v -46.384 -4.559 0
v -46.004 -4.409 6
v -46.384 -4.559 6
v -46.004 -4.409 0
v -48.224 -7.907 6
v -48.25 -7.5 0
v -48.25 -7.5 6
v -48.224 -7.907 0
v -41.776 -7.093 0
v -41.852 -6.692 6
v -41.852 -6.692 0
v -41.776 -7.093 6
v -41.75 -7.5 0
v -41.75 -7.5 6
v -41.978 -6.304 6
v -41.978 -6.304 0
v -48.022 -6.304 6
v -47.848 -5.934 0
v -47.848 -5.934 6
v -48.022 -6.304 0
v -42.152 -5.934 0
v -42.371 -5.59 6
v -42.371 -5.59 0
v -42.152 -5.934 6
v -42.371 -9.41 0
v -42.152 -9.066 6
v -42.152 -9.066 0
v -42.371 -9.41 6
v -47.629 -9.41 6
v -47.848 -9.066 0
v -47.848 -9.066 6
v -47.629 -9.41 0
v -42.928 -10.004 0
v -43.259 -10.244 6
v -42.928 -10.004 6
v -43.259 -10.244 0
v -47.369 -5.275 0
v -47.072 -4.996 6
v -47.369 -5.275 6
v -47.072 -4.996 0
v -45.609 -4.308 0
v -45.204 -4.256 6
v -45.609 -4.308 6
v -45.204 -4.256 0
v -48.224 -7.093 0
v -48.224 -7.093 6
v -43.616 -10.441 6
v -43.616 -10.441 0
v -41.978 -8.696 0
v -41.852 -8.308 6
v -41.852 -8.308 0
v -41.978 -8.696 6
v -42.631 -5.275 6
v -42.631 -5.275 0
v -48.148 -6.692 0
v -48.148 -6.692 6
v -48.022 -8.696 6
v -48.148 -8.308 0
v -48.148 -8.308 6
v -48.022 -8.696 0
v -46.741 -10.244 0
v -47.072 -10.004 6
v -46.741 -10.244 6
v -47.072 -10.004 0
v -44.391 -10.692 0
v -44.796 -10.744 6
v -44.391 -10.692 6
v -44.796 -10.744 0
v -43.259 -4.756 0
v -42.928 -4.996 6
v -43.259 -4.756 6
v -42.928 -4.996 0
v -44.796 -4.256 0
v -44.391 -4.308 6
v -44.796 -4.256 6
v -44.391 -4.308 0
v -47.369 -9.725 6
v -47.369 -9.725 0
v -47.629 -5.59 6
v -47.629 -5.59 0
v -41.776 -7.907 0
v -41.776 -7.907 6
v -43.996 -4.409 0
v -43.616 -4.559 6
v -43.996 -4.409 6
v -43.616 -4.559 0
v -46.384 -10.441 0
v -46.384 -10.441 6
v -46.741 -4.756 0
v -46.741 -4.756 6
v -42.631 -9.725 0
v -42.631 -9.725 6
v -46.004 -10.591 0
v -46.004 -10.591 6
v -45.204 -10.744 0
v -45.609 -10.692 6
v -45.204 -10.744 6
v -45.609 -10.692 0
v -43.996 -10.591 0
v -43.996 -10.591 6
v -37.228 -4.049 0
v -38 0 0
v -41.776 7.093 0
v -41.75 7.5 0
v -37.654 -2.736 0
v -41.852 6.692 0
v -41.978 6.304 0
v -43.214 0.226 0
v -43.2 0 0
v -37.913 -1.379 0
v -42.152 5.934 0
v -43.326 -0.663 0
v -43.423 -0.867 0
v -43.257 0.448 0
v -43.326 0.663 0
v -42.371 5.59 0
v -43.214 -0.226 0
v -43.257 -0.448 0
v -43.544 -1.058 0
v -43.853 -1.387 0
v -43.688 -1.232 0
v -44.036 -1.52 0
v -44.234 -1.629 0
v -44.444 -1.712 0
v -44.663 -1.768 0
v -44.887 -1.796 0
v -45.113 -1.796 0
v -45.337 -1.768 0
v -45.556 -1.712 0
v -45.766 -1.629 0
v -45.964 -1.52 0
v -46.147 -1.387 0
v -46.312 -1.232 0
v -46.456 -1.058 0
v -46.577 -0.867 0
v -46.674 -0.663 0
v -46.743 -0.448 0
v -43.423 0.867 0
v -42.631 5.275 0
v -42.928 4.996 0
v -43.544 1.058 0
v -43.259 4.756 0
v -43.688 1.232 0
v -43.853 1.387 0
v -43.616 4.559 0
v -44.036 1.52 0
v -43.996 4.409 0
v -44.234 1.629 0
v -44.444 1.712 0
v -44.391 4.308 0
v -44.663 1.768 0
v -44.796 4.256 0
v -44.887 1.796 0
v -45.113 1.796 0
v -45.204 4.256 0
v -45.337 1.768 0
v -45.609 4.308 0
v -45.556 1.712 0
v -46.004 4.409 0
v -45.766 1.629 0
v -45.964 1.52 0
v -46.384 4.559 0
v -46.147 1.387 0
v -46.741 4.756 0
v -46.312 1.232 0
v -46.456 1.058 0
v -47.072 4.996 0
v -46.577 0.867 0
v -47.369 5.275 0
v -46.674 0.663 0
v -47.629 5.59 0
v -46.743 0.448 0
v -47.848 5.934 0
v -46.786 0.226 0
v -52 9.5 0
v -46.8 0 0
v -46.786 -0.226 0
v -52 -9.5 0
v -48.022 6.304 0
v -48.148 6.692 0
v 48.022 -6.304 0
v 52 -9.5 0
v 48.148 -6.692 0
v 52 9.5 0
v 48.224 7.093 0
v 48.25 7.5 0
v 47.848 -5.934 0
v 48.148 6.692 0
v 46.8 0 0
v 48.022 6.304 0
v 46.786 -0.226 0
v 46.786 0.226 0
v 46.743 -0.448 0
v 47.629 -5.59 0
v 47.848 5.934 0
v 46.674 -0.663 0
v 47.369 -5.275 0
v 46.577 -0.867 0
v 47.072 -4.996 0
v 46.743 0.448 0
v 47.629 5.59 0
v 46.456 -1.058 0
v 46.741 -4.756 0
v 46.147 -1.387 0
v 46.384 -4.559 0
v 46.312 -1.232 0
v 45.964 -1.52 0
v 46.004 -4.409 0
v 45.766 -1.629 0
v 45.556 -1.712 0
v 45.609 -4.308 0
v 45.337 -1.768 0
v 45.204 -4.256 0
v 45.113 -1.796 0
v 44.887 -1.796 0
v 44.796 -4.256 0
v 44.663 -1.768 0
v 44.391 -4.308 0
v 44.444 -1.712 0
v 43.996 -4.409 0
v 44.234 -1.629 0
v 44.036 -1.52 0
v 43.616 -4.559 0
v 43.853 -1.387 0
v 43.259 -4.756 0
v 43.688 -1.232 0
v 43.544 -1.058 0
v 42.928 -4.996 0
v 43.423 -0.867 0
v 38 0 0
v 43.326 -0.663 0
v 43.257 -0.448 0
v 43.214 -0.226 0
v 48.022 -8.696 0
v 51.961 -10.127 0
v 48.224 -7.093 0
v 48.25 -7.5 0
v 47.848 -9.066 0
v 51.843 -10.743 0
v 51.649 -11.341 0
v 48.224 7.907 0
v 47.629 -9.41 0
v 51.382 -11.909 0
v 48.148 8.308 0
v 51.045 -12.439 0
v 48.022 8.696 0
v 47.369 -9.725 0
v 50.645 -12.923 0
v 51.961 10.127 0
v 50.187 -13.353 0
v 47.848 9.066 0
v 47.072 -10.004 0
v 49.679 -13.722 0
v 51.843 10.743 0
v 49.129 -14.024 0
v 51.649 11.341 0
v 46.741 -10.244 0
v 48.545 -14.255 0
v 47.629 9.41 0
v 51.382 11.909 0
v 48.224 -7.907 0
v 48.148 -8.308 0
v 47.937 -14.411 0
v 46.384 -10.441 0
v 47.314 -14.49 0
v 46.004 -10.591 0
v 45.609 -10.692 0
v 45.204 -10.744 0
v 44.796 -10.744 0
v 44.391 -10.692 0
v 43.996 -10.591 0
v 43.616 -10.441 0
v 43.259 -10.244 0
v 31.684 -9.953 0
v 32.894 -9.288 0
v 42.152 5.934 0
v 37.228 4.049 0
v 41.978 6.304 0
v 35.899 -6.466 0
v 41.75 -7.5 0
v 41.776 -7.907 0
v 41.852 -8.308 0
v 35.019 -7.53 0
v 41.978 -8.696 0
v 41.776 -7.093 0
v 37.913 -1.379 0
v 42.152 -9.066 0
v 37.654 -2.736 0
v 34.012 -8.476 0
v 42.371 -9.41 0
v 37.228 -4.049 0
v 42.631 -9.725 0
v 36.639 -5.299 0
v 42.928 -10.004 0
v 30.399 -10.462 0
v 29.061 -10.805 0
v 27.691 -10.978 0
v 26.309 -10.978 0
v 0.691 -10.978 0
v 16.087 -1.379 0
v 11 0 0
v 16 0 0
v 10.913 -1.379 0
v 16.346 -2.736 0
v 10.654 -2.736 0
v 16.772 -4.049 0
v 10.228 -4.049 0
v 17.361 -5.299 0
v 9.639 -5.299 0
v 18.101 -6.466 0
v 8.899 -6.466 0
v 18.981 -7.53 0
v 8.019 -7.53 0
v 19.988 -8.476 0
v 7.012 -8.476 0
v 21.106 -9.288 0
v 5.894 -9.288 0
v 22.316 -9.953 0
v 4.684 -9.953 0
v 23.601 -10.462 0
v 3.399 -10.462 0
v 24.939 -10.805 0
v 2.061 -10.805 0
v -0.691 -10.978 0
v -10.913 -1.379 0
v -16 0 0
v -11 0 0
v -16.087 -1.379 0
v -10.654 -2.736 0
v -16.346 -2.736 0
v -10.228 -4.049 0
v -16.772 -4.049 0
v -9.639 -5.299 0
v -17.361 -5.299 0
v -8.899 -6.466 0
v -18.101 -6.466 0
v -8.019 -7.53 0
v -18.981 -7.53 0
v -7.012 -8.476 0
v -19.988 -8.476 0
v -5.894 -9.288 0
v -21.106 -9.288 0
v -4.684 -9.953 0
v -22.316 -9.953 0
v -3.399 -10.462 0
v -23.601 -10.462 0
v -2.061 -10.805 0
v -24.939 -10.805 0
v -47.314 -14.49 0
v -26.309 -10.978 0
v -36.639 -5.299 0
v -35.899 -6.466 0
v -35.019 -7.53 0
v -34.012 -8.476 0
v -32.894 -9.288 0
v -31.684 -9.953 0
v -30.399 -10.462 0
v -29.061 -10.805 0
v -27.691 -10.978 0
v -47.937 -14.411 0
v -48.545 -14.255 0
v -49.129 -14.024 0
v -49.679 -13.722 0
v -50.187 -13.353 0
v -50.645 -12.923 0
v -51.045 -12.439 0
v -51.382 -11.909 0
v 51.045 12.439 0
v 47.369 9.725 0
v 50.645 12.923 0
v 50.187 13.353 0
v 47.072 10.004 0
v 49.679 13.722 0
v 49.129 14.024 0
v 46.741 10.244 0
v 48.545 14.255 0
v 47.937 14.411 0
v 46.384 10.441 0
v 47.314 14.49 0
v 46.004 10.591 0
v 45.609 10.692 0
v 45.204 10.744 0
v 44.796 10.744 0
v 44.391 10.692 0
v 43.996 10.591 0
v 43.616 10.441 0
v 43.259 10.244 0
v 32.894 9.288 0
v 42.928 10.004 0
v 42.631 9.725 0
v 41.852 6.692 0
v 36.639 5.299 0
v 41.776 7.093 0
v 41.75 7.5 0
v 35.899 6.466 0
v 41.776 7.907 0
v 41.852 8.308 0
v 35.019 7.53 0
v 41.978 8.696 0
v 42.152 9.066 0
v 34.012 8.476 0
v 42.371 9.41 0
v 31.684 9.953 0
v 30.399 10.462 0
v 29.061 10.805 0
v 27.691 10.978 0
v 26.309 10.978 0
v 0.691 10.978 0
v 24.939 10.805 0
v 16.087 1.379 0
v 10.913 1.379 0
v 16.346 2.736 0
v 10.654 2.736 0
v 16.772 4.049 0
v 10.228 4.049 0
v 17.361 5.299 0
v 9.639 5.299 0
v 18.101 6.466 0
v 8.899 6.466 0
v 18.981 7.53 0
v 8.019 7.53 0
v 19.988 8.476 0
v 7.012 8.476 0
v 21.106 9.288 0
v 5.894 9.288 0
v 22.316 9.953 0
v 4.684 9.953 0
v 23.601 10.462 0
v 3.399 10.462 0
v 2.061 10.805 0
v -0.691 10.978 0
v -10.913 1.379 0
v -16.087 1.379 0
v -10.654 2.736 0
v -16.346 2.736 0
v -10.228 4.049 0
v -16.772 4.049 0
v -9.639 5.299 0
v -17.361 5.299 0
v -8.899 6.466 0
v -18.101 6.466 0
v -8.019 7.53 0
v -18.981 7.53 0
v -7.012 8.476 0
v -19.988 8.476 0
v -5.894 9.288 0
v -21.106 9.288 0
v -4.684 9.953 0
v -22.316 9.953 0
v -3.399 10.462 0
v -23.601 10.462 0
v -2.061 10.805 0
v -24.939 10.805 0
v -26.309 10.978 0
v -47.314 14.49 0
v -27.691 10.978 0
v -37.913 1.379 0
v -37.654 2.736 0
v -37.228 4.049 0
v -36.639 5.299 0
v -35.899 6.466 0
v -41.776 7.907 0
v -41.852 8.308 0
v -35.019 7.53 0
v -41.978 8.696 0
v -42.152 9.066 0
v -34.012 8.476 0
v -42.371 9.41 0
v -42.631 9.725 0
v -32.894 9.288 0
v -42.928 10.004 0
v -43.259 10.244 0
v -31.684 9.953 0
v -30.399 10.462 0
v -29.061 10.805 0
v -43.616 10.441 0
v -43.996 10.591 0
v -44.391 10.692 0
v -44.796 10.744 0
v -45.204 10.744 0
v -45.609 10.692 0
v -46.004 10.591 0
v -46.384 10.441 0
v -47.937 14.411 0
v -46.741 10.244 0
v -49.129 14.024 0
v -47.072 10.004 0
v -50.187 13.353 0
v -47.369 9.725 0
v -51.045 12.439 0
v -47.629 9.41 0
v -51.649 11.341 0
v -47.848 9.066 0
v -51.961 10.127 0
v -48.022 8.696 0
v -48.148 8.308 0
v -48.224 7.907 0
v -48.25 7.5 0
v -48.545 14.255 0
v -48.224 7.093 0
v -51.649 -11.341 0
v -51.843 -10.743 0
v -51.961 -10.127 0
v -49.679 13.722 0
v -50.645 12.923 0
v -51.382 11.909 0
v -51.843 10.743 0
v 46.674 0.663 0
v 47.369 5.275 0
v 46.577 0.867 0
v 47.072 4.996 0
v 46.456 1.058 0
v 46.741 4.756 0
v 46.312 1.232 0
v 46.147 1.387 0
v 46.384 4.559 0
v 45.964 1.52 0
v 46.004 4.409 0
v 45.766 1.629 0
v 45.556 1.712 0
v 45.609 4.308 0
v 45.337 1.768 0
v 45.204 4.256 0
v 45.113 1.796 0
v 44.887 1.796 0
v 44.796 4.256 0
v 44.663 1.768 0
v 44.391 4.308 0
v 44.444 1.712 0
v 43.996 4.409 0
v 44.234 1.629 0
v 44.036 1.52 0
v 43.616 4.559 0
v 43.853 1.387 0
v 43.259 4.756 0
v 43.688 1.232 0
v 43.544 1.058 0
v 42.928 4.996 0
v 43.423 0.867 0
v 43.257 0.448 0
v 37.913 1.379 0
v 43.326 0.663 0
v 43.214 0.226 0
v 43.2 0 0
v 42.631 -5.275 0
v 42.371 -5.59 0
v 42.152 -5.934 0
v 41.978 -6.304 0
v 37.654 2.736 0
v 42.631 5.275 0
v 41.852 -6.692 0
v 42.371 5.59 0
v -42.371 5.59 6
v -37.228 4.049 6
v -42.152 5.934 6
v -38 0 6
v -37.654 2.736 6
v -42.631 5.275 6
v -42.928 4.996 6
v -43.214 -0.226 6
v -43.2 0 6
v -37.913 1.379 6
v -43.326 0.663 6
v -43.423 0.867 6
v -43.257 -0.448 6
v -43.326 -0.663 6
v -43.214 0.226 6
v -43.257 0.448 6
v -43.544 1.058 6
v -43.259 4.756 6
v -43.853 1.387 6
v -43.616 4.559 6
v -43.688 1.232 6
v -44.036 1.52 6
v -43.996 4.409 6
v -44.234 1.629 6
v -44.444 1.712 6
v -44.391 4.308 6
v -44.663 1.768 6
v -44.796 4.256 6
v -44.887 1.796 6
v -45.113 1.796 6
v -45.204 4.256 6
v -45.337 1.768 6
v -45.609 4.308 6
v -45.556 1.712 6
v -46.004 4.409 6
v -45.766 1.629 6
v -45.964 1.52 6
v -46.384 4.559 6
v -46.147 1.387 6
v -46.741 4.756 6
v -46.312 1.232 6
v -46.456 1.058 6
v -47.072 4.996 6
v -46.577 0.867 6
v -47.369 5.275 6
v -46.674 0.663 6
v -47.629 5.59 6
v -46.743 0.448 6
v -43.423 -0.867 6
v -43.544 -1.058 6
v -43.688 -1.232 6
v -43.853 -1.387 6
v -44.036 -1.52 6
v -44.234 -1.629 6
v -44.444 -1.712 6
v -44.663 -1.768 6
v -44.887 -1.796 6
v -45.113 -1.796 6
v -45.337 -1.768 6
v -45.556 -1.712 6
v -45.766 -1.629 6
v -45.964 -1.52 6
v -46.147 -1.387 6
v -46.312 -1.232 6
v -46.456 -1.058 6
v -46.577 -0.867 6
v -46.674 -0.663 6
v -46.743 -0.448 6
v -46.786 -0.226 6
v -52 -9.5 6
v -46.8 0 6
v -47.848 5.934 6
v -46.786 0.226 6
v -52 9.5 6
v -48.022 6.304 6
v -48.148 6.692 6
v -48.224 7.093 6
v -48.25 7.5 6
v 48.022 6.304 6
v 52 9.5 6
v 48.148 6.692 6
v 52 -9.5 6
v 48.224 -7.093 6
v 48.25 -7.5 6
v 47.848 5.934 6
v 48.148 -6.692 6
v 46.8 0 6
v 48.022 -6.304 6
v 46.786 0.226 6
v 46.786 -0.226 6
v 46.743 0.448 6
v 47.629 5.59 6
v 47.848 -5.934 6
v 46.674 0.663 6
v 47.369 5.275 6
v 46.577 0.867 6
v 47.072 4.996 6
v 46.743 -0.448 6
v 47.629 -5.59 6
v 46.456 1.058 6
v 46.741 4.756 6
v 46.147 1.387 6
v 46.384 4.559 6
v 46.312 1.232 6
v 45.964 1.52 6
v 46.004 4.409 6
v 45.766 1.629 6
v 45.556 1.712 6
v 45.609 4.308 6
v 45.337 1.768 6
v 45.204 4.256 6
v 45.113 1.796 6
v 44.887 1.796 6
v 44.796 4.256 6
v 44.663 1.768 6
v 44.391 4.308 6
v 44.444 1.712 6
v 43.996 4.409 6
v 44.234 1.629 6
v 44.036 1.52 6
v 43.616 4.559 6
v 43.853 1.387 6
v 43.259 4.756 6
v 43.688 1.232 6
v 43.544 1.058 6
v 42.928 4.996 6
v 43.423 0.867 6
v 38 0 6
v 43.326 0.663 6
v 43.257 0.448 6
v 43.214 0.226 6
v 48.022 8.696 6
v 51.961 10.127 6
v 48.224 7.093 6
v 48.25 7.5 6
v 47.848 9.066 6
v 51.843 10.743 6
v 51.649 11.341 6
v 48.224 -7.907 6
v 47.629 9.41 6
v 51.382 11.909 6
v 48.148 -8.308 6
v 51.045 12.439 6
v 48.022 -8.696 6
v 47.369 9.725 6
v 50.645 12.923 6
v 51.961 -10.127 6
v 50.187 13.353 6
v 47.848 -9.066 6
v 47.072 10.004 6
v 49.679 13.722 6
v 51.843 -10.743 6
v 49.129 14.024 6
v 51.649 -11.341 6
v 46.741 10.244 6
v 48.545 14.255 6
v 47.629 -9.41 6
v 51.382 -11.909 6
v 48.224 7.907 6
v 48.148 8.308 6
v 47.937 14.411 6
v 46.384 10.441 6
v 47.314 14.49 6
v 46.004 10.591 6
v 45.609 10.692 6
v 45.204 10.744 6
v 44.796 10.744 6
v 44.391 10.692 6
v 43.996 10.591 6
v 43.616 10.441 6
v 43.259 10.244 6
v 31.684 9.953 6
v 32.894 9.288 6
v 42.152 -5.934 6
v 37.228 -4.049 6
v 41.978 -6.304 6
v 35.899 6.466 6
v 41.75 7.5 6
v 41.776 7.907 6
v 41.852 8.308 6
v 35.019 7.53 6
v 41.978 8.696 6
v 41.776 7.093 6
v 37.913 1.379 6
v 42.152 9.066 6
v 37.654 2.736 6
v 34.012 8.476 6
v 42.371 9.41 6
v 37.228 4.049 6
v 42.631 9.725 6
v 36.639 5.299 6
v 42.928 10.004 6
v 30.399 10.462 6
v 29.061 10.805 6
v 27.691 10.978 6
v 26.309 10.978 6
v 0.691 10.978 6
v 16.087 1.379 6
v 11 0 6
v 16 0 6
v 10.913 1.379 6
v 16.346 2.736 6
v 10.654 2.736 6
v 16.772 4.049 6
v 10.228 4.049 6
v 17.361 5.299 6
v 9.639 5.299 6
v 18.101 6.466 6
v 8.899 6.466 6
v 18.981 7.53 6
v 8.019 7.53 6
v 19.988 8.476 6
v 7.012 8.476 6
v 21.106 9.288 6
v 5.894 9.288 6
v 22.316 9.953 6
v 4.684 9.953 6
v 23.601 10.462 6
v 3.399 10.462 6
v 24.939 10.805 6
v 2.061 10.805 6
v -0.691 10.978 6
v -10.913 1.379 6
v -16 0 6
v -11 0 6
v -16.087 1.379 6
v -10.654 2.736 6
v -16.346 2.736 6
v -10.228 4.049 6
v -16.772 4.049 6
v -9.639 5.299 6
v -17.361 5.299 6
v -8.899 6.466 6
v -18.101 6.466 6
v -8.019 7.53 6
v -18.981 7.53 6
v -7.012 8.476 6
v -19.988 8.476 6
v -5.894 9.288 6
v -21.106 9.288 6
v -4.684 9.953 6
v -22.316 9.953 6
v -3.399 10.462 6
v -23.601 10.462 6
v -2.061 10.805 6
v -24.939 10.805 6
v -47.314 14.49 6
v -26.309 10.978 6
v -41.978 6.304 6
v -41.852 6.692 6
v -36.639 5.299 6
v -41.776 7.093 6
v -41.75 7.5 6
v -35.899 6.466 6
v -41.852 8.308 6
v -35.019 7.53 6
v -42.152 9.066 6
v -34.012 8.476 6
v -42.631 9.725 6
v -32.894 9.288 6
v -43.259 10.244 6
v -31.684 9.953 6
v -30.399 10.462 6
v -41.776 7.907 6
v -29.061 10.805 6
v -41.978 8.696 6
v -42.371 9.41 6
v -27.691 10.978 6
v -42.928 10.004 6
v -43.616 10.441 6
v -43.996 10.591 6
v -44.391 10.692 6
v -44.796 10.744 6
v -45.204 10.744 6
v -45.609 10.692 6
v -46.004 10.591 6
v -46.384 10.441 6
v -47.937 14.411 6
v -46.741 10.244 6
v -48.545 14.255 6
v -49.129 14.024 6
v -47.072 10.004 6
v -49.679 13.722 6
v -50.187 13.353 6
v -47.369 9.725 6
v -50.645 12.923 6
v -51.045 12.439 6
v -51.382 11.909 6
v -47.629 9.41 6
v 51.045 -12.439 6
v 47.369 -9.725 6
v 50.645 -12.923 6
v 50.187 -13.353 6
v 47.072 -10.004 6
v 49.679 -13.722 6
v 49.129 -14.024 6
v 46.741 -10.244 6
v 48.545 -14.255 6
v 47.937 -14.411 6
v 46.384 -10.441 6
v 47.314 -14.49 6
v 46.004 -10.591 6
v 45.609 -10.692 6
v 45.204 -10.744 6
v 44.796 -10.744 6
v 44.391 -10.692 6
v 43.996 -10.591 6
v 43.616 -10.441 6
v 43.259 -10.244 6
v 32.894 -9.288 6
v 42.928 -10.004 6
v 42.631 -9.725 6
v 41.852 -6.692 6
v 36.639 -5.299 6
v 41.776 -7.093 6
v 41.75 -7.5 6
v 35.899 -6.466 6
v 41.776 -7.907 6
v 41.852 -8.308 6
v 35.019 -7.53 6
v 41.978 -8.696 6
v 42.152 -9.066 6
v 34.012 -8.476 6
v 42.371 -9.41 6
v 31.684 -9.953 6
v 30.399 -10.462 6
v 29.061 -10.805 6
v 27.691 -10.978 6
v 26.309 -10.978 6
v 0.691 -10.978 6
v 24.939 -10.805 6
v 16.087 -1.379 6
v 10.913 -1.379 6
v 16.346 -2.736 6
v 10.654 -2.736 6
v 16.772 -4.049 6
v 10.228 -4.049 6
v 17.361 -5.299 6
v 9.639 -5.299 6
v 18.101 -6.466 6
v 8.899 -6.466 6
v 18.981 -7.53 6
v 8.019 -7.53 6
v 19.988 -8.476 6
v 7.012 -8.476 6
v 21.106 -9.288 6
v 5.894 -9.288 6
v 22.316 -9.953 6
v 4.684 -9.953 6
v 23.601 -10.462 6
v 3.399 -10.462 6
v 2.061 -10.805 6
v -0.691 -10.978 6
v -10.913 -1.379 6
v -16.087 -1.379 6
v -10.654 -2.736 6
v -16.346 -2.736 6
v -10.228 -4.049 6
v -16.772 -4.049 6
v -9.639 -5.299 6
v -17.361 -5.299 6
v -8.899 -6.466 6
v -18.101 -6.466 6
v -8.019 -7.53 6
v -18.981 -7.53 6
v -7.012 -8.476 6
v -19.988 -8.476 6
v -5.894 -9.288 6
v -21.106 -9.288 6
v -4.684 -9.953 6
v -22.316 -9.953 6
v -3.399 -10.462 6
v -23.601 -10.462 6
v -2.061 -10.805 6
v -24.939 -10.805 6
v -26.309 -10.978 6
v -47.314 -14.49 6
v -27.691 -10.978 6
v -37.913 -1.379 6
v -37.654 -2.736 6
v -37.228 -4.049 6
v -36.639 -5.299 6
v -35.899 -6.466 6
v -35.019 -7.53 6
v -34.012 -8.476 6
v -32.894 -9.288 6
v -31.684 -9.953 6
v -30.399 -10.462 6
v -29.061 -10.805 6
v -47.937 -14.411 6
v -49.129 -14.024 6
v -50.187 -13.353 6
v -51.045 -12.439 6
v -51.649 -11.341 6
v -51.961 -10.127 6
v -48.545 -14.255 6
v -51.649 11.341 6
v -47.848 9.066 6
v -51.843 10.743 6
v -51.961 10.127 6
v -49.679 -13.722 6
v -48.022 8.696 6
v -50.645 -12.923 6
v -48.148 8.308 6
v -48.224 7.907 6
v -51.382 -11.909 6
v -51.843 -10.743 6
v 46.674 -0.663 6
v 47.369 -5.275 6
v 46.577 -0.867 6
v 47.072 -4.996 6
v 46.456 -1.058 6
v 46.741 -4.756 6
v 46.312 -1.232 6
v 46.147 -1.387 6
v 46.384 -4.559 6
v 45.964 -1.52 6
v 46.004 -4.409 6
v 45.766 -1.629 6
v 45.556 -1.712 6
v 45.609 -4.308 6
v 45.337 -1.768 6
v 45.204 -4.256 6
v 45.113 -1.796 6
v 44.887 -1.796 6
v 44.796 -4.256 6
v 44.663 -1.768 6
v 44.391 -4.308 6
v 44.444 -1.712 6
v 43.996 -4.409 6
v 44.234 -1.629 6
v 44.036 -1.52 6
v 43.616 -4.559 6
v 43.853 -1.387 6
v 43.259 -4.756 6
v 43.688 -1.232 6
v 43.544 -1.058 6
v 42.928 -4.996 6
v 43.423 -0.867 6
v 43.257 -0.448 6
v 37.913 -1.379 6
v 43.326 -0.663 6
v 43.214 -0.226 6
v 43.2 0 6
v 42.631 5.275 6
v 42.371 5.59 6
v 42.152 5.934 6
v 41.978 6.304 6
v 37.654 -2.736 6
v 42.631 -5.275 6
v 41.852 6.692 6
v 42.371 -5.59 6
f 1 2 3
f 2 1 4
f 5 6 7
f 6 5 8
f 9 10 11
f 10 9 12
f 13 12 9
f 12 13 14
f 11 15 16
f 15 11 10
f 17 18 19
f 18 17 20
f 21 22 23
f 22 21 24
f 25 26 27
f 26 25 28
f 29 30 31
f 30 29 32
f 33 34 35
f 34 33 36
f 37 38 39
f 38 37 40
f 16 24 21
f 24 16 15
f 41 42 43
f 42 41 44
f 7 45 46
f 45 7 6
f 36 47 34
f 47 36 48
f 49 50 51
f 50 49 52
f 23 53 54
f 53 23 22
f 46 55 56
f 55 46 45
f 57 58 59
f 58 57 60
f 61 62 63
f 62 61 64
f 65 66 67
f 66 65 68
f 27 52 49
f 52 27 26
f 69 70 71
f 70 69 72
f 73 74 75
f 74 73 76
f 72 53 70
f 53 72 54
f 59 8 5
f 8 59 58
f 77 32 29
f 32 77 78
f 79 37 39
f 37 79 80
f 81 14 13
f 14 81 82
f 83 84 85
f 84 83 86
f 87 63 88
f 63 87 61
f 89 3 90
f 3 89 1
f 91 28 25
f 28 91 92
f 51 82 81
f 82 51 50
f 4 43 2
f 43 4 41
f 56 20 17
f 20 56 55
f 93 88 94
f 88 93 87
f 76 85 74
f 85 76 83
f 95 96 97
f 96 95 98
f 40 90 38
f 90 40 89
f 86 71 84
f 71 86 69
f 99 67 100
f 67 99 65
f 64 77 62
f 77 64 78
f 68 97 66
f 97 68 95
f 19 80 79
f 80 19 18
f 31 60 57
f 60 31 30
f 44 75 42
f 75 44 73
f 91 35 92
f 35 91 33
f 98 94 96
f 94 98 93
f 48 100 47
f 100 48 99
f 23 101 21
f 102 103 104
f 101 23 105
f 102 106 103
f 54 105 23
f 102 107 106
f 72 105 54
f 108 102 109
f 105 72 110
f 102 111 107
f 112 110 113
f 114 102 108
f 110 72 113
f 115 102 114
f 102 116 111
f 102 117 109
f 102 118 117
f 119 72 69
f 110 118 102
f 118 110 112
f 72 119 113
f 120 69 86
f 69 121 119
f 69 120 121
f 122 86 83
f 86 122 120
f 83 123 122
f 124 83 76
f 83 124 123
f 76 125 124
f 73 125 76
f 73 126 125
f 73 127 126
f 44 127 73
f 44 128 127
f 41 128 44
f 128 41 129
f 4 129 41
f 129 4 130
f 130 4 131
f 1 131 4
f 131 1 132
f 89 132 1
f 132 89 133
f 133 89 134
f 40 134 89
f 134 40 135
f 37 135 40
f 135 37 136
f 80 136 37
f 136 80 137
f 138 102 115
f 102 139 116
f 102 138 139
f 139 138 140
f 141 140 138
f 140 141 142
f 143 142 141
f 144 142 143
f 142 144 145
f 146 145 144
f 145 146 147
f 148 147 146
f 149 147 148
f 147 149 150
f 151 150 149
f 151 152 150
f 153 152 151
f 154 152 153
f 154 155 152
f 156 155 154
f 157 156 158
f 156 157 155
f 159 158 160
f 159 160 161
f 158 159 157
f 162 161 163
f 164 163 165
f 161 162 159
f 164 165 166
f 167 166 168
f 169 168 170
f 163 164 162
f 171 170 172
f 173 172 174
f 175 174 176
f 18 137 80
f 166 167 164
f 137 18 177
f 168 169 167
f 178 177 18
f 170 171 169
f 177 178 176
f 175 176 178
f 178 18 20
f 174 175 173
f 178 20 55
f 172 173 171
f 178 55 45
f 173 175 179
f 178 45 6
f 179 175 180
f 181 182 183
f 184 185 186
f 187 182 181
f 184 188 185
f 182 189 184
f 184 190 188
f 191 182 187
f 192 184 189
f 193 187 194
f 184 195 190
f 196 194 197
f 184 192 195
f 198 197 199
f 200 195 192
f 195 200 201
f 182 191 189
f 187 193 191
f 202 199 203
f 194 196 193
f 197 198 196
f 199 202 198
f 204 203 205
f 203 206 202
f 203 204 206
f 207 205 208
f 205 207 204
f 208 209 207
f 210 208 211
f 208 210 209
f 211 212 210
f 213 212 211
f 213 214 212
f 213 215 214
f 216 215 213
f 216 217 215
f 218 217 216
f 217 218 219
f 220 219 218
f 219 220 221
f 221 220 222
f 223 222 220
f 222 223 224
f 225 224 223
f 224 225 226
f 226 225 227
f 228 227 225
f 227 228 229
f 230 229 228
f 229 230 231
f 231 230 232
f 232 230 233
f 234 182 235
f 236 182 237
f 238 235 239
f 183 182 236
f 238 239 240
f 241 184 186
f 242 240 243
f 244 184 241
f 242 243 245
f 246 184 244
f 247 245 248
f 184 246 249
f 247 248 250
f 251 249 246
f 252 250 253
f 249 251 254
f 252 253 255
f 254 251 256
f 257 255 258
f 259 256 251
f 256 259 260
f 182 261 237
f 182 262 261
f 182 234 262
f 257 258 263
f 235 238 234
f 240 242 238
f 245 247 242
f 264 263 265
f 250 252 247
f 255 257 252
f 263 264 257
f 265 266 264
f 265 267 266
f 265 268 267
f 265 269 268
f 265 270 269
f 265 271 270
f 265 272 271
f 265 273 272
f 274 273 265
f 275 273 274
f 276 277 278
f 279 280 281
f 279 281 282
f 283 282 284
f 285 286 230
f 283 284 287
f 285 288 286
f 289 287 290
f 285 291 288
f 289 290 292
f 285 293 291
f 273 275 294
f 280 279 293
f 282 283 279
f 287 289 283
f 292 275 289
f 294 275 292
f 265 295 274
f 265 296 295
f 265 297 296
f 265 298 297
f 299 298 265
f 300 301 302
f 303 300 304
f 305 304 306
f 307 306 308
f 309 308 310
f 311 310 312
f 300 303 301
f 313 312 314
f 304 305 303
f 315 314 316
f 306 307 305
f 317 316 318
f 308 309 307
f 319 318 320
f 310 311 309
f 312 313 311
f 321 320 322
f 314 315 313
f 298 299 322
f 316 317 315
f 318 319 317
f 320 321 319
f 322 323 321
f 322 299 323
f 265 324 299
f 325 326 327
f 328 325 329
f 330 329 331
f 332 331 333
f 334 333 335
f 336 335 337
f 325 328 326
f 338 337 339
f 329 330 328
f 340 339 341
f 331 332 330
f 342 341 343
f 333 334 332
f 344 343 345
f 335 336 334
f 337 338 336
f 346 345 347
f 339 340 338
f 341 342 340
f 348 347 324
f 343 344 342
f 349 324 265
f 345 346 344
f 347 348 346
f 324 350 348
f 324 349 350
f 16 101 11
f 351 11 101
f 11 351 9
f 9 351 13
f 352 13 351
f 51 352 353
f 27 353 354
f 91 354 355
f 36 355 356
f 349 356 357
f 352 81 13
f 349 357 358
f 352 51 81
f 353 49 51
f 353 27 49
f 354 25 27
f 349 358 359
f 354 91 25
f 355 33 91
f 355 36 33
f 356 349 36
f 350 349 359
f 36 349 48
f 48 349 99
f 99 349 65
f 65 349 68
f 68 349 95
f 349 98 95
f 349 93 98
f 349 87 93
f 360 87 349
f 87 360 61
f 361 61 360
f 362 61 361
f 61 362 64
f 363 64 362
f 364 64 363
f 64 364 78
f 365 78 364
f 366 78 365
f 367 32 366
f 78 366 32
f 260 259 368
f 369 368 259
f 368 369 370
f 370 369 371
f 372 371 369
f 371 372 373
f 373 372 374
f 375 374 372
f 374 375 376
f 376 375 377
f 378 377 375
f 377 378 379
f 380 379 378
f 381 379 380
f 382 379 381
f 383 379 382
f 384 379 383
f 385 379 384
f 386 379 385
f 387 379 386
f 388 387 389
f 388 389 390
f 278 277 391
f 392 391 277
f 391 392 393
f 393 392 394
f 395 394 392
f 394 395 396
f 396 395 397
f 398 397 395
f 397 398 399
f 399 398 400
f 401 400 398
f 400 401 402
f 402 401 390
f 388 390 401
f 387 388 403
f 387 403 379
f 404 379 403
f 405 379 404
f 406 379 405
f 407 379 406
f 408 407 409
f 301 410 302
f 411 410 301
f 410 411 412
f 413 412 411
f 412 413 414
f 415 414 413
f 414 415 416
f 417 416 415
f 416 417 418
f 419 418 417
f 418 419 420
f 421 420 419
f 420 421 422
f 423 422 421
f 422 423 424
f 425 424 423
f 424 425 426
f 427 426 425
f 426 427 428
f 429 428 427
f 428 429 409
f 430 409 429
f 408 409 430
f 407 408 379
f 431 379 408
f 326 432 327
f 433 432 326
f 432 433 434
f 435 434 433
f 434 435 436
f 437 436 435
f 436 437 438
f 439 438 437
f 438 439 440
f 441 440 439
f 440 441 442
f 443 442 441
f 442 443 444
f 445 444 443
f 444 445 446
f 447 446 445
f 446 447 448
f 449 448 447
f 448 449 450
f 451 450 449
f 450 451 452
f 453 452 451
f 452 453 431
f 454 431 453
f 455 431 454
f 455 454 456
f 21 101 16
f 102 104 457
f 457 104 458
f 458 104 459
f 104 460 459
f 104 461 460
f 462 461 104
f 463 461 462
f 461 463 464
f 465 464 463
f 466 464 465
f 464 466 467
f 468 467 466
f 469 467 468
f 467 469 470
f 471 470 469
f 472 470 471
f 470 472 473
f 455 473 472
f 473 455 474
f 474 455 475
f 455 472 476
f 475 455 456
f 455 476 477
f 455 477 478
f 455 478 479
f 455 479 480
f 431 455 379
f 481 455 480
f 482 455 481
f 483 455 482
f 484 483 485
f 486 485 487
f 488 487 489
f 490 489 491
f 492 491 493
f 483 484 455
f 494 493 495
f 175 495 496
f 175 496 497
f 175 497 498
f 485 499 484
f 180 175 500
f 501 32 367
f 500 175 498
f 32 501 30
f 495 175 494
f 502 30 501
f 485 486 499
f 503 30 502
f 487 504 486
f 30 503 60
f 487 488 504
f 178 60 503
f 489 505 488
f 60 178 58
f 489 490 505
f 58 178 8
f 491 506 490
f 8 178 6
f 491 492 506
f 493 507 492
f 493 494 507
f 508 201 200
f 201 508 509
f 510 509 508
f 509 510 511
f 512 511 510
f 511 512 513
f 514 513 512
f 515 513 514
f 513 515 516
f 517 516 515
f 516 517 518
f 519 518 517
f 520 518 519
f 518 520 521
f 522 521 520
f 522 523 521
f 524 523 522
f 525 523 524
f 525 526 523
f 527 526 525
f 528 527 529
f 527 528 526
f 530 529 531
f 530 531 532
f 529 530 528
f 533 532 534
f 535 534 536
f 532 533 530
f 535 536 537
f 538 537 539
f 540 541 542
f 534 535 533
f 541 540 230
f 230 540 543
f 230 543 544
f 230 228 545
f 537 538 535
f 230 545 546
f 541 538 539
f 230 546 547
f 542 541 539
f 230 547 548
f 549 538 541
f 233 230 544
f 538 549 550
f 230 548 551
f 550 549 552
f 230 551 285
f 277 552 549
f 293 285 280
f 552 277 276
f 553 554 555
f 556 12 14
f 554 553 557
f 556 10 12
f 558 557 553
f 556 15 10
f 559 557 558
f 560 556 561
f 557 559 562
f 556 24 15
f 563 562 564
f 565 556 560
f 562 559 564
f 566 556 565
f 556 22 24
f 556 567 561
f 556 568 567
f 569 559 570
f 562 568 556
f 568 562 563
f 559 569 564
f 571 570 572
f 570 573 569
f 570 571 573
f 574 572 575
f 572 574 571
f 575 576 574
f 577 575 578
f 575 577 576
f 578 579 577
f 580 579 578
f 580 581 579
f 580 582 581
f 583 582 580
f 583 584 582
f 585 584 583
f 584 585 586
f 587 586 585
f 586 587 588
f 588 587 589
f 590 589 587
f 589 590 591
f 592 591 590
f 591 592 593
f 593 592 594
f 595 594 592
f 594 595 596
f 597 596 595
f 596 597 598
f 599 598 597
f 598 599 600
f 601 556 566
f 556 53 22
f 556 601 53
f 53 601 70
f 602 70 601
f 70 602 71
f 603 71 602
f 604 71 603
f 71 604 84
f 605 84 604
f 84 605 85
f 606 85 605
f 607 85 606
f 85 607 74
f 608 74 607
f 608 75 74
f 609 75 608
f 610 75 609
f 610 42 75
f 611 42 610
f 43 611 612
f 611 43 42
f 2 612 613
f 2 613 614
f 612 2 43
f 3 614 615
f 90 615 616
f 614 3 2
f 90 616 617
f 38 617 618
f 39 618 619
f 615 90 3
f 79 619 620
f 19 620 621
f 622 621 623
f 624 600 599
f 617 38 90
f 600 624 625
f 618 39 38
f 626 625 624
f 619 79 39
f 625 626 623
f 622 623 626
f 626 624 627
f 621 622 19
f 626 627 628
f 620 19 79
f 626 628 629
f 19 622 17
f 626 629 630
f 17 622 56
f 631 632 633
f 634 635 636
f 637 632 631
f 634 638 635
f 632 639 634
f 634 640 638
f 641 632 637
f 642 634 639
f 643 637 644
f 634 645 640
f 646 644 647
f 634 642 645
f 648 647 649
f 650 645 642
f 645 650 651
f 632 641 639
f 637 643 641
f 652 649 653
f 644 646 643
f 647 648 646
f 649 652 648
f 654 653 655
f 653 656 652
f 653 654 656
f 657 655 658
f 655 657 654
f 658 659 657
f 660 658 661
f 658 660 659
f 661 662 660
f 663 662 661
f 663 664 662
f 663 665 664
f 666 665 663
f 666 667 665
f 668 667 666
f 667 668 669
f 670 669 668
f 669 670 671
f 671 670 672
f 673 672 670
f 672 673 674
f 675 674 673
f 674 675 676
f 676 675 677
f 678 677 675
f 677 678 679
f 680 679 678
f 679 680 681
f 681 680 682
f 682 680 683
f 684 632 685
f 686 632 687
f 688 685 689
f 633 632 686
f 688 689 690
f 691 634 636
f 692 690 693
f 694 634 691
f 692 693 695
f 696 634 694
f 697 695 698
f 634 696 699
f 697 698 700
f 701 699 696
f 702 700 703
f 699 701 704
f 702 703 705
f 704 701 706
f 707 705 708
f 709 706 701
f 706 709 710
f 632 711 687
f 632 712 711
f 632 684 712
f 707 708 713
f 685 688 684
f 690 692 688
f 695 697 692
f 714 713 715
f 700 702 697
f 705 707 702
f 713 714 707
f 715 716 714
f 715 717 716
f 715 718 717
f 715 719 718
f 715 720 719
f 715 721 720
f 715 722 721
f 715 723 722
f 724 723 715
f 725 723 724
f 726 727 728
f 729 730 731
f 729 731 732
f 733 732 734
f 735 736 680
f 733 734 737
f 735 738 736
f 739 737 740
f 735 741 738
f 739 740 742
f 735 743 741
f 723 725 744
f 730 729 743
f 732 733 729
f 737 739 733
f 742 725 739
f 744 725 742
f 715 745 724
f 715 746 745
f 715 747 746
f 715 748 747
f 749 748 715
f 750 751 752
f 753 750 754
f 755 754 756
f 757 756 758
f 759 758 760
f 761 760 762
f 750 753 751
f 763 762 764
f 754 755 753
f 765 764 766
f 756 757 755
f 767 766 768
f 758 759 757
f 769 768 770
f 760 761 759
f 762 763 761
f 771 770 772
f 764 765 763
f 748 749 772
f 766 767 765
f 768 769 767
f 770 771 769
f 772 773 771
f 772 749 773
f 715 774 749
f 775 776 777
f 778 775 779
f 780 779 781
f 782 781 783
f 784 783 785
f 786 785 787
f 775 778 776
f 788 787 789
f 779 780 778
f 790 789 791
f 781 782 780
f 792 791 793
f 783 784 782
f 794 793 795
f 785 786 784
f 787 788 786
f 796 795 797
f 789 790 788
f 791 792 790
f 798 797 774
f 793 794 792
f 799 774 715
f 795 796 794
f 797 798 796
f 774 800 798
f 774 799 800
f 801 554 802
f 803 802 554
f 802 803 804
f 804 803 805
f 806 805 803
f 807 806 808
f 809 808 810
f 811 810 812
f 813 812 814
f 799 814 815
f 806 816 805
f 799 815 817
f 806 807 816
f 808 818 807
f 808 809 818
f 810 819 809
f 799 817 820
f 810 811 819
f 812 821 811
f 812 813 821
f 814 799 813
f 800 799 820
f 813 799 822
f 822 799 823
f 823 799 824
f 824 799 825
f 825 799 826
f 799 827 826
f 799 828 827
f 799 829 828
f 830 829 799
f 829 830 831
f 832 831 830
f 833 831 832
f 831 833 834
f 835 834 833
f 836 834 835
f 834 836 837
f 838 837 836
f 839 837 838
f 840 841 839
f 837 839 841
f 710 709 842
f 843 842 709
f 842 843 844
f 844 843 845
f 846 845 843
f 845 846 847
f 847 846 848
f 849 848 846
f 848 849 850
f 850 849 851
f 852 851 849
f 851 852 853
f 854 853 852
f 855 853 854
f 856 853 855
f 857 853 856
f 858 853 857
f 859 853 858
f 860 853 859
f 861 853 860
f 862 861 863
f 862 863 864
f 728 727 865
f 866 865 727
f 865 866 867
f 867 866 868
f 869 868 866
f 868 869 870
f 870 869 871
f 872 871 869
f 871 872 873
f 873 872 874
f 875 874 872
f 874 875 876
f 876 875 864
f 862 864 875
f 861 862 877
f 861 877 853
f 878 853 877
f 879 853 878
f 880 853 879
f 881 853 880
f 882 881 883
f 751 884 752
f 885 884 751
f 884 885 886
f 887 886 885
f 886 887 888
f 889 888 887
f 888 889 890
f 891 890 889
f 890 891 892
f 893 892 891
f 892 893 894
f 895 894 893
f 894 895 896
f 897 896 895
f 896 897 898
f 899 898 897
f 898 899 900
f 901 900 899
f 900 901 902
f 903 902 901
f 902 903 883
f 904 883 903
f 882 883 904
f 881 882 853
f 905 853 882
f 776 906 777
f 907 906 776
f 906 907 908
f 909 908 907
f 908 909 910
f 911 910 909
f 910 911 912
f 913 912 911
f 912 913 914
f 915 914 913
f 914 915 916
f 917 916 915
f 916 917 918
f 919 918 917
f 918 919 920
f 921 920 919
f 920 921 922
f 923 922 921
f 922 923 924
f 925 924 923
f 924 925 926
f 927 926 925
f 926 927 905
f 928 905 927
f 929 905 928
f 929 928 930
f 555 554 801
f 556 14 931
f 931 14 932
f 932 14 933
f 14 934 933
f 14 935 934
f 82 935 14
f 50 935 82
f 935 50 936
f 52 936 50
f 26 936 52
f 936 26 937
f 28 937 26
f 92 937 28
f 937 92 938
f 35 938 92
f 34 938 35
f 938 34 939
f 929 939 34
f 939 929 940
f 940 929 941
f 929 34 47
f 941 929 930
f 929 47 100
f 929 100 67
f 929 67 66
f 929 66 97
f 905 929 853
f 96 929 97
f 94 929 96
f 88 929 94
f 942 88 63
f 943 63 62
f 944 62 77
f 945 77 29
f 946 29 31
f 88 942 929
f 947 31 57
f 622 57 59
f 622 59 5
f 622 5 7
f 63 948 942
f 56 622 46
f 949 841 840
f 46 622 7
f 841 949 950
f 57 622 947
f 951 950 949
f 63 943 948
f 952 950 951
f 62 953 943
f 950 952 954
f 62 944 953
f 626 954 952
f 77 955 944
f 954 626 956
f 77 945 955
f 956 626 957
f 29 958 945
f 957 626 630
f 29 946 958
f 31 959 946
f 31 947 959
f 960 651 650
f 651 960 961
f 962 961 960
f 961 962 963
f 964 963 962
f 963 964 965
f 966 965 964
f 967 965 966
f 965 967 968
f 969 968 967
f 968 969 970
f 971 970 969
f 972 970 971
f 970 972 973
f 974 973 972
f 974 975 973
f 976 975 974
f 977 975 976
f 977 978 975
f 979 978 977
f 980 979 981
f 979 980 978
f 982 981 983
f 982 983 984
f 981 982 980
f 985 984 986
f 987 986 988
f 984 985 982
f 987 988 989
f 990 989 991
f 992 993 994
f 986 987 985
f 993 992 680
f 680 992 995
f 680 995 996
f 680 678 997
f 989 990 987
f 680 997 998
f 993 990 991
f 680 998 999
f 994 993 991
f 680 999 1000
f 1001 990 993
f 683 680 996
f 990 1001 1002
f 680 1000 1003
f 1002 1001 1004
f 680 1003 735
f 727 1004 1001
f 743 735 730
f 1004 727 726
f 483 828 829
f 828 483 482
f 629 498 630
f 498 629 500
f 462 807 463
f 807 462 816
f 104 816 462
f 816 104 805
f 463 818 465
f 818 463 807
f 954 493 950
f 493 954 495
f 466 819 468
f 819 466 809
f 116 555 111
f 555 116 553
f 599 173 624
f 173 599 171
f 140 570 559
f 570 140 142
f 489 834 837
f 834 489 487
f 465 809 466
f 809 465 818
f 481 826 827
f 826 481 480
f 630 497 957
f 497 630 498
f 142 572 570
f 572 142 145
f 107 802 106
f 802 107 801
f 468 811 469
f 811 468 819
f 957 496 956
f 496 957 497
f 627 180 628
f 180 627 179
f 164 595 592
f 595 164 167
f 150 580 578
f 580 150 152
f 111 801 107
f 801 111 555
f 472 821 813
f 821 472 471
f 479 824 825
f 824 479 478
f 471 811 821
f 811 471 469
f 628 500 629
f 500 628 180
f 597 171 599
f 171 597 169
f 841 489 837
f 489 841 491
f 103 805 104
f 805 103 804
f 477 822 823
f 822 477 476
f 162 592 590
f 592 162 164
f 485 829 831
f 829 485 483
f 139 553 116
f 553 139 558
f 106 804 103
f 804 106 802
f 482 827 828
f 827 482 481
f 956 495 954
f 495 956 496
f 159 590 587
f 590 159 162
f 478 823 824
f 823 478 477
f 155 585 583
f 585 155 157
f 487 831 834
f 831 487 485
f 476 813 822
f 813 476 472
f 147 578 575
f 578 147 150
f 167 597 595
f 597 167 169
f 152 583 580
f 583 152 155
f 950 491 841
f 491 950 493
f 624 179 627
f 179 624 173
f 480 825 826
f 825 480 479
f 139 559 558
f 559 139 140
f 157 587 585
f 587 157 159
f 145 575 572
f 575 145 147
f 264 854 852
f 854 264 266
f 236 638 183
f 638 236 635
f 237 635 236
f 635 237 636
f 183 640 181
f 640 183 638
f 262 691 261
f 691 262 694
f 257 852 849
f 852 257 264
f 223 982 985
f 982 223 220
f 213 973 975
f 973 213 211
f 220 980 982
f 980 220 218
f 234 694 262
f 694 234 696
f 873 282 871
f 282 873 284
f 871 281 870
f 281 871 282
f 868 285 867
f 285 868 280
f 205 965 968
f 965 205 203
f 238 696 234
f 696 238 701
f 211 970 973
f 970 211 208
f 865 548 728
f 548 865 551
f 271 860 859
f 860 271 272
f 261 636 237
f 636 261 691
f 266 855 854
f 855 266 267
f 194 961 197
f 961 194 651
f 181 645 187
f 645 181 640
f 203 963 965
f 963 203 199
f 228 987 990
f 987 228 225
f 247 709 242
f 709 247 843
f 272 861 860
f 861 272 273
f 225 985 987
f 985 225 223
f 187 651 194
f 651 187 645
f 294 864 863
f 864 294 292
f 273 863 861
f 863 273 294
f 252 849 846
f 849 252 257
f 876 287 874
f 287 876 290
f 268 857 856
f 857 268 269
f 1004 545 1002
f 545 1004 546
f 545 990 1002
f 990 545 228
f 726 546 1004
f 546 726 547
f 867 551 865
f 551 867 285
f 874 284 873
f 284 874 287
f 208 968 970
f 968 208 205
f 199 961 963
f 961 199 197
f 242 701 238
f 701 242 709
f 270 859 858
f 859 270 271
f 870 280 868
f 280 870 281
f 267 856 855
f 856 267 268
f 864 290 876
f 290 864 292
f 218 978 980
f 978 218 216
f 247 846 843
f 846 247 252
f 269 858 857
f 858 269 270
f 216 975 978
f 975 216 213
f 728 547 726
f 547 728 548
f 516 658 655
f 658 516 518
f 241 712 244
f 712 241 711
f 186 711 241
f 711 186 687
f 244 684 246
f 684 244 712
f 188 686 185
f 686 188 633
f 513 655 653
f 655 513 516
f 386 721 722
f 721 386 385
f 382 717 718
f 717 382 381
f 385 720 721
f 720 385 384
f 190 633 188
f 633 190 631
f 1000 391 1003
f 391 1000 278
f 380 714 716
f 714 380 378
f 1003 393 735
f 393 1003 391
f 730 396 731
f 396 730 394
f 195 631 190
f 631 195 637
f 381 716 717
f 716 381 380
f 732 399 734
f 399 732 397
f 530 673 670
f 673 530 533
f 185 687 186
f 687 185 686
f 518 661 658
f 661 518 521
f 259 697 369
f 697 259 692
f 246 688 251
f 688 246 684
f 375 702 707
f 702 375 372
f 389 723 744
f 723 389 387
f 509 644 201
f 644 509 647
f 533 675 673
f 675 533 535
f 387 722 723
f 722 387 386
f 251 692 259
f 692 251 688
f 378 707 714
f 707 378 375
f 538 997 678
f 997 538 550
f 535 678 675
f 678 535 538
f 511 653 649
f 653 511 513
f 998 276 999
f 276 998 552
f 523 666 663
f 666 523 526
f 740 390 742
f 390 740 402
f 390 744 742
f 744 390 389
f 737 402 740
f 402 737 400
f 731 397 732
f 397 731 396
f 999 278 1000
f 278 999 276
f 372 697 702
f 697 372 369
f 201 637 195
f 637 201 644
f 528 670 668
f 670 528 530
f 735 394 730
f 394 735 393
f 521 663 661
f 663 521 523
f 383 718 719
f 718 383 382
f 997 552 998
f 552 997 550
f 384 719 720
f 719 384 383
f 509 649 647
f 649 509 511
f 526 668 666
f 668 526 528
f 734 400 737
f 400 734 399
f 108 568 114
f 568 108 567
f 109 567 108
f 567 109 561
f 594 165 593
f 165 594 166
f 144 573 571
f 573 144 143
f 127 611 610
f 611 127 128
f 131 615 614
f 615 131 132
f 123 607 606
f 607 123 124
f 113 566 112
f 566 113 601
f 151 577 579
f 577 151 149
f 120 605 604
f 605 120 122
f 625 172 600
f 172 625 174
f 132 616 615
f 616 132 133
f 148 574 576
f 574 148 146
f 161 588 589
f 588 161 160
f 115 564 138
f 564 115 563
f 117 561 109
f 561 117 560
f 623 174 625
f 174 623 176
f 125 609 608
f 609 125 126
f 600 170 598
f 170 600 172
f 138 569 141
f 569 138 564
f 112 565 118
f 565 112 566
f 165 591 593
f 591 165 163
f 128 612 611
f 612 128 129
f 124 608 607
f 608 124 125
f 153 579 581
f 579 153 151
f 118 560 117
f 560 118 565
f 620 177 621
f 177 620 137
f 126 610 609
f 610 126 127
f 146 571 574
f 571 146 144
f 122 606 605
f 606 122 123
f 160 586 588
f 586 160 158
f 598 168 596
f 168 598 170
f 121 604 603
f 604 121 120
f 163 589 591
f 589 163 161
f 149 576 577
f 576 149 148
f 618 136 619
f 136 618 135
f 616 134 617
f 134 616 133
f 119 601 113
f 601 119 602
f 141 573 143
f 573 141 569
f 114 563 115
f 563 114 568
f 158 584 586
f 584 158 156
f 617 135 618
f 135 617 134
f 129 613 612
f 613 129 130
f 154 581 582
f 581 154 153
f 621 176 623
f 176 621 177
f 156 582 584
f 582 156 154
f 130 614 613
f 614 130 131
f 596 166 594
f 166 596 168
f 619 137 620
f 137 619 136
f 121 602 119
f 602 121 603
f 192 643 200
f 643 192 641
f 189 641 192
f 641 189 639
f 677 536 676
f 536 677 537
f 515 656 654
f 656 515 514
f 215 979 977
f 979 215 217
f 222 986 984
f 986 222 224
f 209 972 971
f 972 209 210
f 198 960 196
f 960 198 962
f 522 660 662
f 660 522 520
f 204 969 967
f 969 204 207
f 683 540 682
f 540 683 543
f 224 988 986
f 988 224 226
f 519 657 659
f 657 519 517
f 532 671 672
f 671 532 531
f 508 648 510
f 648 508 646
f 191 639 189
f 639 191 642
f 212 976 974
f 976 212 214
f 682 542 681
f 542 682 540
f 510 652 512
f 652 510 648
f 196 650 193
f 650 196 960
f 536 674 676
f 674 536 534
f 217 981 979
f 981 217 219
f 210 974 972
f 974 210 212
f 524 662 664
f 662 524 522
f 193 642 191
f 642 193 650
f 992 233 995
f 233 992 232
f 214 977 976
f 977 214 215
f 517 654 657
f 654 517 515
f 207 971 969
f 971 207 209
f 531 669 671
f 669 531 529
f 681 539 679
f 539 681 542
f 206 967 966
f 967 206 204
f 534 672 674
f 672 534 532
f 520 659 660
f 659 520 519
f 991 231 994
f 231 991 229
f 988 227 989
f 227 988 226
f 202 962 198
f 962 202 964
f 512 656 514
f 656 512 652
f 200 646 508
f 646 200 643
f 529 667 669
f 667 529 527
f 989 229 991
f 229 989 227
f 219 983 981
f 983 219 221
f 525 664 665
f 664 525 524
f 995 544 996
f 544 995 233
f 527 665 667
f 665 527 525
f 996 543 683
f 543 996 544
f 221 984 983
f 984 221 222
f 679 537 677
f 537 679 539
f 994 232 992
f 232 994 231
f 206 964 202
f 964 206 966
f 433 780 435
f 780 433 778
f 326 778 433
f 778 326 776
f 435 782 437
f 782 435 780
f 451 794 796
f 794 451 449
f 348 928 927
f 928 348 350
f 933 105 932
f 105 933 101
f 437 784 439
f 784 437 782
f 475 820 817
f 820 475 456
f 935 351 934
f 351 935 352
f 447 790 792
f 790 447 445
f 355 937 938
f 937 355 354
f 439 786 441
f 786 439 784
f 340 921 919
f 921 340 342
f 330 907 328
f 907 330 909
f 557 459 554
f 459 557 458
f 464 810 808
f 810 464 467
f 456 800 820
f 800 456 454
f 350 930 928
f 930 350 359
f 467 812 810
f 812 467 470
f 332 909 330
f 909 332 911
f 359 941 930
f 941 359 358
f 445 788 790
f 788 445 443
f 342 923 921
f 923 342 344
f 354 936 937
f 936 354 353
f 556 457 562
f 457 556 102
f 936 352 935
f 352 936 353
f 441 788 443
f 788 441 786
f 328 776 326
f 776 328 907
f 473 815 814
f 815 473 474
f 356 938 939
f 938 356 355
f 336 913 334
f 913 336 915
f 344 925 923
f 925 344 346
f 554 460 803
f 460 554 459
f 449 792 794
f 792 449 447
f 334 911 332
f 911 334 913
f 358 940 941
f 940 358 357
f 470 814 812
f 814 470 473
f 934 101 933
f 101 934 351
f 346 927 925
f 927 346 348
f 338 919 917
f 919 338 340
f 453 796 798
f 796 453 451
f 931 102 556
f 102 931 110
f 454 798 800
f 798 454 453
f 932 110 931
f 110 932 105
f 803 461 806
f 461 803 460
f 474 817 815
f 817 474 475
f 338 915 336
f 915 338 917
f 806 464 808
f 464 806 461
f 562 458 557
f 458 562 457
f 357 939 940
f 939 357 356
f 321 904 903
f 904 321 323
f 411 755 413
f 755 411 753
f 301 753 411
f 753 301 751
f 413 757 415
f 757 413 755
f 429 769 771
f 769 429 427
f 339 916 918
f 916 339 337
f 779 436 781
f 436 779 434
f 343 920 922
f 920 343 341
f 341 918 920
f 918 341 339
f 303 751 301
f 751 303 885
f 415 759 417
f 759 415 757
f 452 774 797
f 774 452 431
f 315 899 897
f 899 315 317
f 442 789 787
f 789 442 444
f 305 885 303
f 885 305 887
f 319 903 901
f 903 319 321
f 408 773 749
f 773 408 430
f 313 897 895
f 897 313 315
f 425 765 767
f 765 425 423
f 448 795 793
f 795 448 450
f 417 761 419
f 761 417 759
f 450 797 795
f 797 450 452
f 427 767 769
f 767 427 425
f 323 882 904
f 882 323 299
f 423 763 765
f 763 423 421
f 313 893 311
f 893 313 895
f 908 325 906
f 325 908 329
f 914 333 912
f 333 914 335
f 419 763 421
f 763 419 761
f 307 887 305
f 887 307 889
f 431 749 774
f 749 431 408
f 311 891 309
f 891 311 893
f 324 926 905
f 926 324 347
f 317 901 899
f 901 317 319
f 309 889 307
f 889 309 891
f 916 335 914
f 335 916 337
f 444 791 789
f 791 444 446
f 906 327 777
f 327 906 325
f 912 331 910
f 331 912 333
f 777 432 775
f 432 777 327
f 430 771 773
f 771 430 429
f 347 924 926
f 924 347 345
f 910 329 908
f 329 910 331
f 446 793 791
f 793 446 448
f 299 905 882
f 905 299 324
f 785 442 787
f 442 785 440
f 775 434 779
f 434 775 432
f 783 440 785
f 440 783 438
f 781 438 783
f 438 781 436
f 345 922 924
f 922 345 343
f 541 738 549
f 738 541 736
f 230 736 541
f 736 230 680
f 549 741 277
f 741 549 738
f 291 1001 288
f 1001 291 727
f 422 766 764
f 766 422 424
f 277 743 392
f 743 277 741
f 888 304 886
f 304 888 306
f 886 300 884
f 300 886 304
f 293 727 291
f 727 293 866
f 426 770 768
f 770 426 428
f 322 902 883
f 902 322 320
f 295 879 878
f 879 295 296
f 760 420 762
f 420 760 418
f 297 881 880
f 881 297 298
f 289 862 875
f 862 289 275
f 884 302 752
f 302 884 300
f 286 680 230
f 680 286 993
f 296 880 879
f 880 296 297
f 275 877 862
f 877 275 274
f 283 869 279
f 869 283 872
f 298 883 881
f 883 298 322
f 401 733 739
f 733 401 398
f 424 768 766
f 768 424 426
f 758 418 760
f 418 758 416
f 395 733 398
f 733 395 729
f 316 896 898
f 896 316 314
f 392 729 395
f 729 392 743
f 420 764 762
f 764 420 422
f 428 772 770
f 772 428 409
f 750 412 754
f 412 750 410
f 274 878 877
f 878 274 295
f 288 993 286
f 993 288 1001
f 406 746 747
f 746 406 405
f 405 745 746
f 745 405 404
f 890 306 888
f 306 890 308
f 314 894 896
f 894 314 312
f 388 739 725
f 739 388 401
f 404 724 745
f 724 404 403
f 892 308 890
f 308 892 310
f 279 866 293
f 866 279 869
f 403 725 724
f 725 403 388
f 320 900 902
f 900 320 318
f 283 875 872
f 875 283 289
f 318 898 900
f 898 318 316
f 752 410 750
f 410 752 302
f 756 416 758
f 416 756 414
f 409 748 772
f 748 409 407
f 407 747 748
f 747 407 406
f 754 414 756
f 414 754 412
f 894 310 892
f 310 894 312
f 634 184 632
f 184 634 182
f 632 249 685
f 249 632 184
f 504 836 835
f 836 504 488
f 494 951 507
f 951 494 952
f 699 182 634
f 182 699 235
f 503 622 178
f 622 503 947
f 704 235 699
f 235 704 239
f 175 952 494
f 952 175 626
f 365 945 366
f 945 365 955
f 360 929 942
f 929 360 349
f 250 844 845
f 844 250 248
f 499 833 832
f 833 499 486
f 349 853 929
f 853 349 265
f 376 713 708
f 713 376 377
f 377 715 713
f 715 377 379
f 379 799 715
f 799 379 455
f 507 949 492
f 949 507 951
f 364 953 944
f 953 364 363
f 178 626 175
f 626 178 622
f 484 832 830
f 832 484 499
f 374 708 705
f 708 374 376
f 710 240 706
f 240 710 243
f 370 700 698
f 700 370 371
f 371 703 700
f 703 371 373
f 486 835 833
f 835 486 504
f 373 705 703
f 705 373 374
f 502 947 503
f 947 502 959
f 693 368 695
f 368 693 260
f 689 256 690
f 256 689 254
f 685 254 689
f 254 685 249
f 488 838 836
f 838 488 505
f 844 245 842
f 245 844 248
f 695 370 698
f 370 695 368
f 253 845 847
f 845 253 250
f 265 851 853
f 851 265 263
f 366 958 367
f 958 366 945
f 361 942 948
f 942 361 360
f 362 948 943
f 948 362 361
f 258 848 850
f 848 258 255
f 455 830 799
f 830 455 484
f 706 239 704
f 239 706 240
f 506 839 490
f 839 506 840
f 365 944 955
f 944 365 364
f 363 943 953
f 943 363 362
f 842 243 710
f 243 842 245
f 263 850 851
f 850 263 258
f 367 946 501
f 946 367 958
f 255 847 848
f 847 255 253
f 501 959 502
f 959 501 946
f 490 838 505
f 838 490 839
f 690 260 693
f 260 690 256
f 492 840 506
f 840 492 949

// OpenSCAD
$fn = 50;

difference() {
	union() {
		hull() {
			translate(v = [-47.0, 9.5, 0]) {
				cylinder(h = 6, r = 5);
			}
			translate(v = [47.0, 9.5, 0]) {
				cylinder(h = 6, r = 5);
			}
			translate(v = [-47.0, -9.5, 0]) {
				cylinder(h = 6, r = 5);
			}
			translate(v = [47.0, -9.5, 0]) {
				cylinder(h = 6, r = 5);
			}
		}
	}
	union() {
		translate(v = [-45.0, -7.5, 0]) {
			cylinder(h = 6, r = 3.25);
		}
		translate(v = [-45.0, 7.5, 0]) {
			cylinder(h = 6, r = 3.25);
		}
		translate(v = [45.0, -7.5, 0]) {
			cylinder(h = 6, r = 3.25);
		}
		translate(v = [45.0, 7.5, 0]) {
			cylinder(h = 6, r = 3.25);
		}
		translate(v = [-45.0, 0.0, 0]) {
			cylinder(h = 6, r = 1.8);
		}
		translate(v = [45.0, 0.0, 0]) {
			cylinder(h = 6, r = 1.8);
		}
		translate(v = [-27.0, 0, 0.0]) {
			cylinder(h = 6, r = 11.0);
		}
		cylinder(h = 6, r = 11.0);
		translate(v = [27.0, 0, 0.0]) {
			cylinder(h = 6, r = 11.0);
		}
	}
}
